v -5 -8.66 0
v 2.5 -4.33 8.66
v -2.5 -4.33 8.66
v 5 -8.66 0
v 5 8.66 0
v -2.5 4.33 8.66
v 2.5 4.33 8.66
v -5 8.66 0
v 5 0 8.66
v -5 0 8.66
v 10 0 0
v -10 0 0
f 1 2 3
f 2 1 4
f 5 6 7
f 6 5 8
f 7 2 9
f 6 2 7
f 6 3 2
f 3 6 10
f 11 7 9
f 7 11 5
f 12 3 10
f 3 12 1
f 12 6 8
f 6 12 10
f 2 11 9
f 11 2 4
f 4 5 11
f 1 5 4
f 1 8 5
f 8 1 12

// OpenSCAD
/* [Global] */


/* [Resolution] */

resolution = 6; // [6:100]



/* [Hidden] */

dome_size= 10;


print_part();

module print_part() {
	
	// this will create a high resolution sphere with parametric resolution

	difference()
	{
	
		sphere (dome_size,$fn=resolution);

		translate([0,0,-dome_size])
		
		{
		cube(dome_size*2, center =true);

		//cylinder(r=2, h=20, center= true, $nf=40);

		}	
	}
	
}
